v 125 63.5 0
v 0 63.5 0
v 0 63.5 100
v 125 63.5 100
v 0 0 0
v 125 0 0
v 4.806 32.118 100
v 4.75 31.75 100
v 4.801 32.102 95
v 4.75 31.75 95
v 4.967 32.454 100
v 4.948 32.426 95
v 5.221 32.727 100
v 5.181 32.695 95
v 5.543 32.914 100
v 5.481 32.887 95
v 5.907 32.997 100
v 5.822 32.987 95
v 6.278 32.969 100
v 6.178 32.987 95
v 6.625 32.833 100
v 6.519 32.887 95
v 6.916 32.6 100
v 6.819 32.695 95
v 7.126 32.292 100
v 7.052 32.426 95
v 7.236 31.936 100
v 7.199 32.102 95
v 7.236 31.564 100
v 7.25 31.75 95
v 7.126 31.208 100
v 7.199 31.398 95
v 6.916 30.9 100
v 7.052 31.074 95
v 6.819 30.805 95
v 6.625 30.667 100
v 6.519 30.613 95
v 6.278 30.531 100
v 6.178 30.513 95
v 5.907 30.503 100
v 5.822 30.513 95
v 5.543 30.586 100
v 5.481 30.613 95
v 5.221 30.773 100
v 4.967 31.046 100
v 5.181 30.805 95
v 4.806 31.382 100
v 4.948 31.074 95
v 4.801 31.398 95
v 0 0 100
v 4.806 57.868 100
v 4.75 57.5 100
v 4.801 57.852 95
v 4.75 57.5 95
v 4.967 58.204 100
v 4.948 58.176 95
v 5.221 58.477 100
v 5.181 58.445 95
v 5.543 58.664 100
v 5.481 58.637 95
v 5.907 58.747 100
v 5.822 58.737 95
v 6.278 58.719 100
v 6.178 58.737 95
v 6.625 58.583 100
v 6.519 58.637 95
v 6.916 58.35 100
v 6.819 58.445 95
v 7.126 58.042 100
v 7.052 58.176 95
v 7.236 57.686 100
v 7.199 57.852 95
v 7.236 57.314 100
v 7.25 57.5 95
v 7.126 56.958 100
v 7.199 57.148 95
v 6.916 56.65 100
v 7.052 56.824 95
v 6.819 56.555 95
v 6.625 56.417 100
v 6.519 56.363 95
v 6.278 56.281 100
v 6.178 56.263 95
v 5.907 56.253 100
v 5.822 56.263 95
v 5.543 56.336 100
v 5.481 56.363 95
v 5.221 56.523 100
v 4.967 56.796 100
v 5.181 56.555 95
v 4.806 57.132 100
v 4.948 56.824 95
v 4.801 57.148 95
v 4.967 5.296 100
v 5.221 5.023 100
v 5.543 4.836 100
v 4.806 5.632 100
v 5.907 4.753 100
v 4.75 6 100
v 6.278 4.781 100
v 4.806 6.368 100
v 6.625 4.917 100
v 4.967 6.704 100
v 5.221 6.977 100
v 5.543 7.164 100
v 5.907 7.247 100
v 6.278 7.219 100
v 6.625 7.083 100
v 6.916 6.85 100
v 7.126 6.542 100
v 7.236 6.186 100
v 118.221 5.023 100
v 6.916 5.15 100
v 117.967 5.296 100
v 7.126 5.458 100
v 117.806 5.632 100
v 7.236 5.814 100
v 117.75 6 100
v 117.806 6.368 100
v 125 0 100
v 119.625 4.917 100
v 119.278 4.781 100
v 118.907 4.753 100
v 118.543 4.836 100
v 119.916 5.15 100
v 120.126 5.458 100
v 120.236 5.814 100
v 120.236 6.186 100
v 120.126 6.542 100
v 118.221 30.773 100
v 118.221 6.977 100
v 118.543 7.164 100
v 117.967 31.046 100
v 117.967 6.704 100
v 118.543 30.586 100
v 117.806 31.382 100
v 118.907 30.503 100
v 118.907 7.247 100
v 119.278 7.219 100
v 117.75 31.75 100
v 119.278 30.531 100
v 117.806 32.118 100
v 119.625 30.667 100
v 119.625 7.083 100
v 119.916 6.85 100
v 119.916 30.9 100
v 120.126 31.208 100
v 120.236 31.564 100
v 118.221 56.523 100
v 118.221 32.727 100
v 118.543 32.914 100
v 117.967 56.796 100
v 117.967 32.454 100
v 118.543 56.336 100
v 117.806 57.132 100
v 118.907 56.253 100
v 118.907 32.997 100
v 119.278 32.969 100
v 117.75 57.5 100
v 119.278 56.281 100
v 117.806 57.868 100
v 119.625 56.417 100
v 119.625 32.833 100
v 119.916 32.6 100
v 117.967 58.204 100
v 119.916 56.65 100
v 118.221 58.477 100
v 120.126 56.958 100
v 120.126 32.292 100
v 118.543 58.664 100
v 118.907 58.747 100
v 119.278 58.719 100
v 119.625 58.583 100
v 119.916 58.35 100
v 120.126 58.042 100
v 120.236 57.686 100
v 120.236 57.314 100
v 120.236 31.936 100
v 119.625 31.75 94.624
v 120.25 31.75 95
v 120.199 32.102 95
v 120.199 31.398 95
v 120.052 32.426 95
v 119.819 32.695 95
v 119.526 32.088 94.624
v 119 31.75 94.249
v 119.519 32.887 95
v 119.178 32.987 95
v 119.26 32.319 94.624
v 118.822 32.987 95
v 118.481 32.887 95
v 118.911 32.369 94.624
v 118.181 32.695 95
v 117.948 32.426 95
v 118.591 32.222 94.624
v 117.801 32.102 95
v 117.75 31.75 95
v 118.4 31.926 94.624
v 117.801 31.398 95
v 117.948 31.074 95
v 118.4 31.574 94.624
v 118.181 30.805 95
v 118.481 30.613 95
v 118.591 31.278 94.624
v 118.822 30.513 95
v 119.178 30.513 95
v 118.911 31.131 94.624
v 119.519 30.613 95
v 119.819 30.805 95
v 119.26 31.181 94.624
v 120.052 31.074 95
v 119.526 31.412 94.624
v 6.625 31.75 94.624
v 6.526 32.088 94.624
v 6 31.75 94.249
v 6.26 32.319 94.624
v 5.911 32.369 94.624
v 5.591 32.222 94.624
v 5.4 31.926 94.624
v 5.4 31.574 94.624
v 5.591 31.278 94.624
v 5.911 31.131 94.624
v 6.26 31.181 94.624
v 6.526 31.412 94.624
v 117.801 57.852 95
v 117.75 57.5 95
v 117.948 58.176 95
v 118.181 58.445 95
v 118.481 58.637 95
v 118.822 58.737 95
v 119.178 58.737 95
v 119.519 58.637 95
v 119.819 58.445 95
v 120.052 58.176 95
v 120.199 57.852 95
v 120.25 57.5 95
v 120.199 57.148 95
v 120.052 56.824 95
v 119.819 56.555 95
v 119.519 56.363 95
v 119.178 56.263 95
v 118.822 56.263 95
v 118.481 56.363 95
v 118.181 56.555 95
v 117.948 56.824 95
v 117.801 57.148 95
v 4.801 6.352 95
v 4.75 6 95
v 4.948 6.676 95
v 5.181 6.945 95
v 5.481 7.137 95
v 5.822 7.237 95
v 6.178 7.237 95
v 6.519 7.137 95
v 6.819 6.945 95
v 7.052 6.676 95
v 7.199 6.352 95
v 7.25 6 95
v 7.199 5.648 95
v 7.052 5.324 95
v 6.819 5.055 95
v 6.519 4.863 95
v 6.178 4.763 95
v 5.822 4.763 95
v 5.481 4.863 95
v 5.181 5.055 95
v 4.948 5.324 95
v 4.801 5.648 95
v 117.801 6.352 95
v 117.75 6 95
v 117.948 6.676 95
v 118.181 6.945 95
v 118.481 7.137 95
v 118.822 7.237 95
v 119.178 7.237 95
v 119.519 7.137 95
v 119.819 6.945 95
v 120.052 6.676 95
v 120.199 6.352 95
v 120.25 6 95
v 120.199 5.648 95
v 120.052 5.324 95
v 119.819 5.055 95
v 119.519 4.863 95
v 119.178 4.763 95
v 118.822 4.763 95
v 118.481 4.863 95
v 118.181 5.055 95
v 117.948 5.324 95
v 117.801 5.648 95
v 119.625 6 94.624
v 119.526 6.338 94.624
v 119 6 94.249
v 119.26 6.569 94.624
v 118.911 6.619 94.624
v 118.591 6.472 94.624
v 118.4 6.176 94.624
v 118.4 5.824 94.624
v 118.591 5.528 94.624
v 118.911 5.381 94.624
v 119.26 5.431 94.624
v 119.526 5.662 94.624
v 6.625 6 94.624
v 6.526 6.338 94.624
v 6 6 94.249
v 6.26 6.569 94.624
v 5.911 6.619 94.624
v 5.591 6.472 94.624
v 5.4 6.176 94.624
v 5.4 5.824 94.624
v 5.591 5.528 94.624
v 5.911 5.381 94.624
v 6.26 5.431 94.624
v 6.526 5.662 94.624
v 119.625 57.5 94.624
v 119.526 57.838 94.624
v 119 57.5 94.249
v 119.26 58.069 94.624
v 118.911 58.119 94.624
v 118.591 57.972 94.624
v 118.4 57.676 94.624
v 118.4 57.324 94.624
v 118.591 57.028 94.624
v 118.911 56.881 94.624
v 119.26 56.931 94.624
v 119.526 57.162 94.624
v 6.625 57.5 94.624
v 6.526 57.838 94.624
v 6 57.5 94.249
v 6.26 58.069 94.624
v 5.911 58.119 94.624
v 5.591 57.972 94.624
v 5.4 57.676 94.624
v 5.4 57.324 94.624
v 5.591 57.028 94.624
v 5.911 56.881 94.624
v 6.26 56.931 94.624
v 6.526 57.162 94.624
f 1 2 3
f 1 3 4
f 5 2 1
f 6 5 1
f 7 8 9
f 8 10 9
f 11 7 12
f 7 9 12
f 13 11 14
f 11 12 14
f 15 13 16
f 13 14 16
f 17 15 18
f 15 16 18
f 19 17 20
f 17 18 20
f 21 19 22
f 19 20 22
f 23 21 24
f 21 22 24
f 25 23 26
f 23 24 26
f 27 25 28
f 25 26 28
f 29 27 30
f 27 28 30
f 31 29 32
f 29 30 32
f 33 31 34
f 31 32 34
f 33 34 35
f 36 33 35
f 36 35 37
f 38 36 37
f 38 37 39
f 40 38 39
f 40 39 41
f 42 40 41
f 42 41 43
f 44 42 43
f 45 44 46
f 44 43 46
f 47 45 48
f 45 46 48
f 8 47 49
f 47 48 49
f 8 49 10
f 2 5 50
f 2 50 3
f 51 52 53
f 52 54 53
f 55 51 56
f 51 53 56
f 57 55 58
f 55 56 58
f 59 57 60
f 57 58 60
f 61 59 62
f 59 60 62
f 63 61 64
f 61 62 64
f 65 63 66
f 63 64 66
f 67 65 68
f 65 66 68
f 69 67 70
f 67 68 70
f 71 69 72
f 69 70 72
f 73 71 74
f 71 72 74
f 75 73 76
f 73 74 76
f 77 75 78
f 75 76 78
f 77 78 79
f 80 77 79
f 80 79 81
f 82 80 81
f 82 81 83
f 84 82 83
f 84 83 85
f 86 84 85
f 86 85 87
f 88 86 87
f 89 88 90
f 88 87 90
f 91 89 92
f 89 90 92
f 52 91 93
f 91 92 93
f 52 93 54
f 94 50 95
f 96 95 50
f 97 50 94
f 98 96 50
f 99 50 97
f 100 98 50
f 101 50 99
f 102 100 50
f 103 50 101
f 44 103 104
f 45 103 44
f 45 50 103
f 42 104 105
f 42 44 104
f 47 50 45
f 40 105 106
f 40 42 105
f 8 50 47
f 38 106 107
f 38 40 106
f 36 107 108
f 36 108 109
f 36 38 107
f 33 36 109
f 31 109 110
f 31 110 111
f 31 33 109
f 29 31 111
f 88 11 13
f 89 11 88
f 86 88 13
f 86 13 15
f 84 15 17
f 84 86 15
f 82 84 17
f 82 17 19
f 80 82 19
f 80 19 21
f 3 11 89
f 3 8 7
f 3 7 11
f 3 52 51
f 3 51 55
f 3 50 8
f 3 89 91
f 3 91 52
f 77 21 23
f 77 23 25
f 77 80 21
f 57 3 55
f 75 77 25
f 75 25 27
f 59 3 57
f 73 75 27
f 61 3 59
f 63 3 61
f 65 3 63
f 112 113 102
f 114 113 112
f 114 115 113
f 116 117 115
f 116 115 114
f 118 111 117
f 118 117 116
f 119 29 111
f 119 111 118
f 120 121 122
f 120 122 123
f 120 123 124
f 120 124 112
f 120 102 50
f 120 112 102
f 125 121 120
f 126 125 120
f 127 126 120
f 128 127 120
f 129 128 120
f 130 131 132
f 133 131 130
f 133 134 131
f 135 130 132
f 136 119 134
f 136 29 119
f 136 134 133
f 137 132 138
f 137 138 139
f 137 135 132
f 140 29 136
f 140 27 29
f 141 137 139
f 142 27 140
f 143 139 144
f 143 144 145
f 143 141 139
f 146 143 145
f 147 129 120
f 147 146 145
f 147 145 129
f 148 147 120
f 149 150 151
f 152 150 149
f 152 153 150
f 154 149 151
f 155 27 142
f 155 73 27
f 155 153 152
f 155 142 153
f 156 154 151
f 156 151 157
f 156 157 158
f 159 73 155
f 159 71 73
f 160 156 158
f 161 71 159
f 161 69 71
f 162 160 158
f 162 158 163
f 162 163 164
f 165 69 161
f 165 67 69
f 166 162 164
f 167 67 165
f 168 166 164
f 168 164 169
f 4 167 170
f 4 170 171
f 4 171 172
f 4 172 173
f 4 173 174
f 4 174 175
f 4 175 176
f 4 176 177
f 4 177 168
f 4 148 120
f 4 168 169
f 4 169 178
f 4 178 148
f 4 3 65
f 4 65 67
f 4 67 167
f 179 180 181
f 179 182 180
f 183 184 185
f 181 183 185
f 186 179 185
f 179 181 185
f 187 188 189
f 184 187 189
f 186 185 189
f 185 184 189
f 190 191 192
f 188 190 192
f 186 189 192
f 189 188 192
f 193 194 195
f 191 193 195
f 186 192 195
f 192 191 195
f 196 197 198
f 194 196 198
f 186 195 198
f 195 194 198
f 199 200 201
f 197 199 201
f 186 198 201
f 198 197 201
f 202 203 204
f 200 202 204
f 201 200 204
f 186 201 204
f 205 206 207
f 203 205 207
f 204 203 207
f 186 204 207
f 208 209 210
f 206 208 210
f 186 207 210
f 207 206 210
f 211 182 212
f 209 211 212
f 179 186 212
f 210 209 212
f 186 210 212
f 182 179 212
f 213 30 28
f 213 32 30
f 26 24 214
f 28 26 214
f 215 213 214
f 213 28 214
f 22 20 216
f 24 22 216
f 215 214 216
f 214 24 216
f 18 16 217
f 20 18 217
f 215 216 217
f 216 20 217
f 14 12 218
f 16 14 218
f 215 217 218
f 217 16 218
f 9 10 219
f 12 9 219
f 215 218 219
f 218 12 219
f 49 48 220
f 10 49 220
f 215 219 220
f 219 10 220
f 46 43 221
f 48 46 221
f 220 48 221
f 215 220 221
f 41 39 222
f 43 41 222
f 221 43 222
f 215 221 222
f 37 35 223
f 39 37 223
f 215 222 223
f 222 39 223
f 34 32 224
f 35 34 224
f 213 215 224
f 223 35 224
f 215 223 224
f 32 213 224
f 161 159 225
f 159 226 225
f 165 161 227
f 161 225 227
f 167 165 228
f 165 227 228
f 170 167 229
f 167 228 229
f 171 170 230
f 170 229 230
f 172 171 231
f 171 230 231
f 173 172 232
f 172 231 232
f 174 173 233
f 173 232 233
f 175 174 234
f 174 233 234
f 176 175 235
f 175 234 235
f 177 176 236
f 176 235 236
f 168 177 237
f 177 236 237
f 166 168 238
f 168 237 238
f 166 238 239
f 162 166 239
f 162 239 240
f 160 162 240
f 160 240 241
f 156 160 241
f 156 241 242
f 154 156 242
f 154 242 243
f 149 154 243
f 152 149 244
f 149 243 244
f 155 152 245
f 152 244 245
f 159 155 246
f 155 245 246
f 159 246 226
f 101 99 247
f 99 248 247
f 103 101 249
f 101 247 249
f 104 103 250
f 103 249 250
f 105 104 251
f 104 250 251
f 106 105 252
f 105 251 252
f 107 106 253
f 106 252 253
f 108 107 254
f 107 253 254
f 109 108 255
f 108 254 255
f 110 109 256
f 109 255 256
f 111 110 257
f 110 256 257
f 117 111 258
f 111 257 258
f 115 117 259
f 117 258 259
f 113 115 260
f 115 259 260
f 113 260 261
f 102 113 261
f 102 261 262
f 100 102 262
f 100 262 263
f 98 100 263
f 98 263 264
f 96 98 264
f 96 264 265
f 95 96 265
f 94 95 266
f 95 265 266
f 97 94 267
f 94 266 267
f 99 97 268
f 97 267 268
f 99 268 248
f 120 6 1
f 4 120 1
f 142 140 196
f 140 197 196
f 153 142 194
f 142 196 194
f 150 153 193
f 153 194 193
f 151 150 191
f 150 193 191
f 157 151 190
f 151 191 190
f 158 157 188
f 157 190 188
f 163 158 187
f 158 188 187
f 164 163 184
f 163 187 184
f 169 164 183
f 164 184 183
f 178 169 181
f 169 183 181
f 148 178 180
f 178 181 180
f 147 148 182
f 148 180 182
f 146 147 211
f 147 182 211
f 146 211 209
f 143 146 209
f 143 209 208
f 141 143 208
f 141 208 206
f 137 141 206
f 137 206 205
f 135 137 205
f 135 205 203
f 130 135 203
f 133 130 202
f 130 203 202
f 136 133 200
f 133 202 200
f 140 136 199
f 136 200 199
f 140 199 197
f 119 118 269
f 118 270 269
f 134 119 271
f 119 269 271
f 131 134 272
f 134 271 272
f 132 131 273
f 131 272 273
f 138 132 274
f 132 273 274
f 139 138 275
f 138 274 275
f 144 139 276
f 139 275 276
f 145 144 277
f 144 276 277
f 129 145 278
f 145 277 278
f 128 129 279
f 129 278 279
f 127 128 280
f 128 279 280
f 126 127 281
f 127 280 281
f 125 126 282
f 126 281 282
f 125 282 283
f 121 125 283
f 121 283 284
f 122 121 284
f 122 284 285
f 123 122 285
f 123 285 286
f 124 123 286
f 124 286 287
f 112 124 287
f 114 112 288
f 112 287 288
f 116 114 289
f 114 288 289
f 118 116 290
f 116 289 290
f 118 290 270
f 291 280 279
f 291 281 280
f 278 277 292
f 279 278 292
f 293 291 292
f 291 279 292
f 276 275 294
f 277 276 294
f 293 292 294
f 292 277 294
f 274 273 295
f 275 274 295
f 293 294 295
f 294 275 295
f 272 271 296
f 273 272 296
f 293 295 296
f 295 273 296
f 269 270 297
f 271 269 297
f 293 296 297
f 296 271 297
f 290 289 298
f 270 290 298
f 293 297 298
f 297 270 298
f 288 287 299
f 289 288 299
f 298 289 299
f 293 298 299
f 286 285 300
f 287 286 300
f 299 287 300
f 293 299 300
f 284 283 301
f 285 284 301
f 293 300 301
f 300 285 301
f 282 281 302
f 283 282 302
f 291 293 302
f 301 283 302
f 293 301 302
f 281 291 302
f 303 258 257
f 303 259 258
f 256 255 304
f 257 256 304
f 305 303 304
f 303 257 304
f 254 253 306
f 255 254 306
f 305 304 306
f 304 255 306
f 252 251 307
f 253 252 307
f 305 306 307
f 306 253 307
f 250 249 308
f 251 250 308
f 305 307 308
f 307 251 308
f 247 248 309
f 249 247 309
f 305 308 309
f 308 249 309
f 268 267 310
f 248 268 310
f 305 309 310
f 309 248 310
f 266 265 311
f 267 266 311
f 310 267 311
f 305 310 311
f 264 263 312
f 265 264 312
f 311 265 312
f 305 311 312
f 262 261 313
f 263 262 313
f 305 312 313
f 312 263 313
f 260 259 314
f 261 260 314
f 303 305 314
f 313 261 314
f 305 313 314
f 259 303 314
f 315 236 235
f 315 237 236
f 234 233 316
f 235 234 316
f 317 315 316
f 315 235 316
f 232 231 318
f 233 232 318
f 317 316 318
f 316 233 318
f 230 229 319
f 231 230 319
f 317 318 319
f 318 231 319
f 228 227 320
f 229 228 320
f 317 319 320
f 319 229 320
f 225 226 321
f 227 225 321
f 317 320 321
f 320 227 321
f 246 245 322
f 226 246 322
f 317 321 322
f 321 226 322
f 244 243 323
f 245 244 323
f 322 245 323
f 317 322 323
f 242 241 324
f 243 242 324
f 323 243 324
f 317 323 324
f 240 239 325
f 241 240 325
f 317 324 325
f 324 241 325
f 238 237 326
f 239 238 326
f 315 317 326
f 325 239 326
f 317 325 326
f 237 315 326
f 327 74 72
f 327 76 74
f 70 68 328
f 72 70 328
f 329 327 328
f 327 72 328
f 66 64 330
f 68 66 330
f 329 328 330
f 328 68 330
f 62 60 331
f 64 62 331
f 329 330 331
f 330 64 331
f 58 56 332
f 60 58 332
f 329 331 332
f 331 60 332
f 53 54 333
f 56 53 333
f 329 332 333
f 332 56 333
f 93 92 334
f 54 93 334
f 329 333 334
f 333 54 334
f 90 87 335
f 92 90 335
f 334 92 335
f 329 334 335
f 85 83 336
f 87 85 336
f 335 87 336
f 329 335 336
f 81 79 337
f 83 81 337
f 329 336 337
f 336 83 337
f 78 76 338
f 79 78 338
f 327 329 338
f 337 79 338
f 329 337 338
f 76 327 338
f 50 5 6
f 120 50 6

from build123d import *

# Parameters (mm, degrees)
SKETCH1_W                       = 125
SKETCH1_H                       = 63.5
BOSS_EXTRUDE1_DEPTH             = 100
TAP_DRILL_FOR_M3X0_5_TAP1_D     = 2.5
TAP_DRILL_FOR_M3X0_5_TAP1_DEPTH = 5
TAP_DRILL_FOR_M3X0_5_TAP1_TIP   = 0.751075774


with BuildPart() as part:
    # Sketch1 → Boss-Extrude1 (new body)
    with BuildSketch(Plane.XY):
        with Locations((62.5, 31.75)):
            Rectangle(SKETCH1_W, SKETCH1_H)
    extrude(amount=BOSS_EXTRUDE1_DEPTH)

    # Tap Drill for M3x0.5 Tap1
    with Locations(Plane.XY.offset(100)):
        with Locations((6, 57.5), (119, 57.5), (119, 6), (6, 6), (119, 31.75), (6, 31.75)):
            Hole(TAP_DRILL_FOR_M3X0_5_TAP1_D / 2, depth=TAP_DRILL_FOR_M3X0_5_TAP1_DEPTH)
            with Locations((0, 0, -(TAP_DRILL_FOR_M3X0_5_TAP1_DEPTH + TAP_DRILL_FOR_M3X0_5_TAP1_TIP / 2))):  # 118° drill point
                Cone(0, TAP_DRILL_FOR_M3X0_5_TAP1_D / 2, TAP_DRILL_FOR_M3X0_5_TAP1_TIP, mode=Mode.SUBTRACT)


solid = part.part
